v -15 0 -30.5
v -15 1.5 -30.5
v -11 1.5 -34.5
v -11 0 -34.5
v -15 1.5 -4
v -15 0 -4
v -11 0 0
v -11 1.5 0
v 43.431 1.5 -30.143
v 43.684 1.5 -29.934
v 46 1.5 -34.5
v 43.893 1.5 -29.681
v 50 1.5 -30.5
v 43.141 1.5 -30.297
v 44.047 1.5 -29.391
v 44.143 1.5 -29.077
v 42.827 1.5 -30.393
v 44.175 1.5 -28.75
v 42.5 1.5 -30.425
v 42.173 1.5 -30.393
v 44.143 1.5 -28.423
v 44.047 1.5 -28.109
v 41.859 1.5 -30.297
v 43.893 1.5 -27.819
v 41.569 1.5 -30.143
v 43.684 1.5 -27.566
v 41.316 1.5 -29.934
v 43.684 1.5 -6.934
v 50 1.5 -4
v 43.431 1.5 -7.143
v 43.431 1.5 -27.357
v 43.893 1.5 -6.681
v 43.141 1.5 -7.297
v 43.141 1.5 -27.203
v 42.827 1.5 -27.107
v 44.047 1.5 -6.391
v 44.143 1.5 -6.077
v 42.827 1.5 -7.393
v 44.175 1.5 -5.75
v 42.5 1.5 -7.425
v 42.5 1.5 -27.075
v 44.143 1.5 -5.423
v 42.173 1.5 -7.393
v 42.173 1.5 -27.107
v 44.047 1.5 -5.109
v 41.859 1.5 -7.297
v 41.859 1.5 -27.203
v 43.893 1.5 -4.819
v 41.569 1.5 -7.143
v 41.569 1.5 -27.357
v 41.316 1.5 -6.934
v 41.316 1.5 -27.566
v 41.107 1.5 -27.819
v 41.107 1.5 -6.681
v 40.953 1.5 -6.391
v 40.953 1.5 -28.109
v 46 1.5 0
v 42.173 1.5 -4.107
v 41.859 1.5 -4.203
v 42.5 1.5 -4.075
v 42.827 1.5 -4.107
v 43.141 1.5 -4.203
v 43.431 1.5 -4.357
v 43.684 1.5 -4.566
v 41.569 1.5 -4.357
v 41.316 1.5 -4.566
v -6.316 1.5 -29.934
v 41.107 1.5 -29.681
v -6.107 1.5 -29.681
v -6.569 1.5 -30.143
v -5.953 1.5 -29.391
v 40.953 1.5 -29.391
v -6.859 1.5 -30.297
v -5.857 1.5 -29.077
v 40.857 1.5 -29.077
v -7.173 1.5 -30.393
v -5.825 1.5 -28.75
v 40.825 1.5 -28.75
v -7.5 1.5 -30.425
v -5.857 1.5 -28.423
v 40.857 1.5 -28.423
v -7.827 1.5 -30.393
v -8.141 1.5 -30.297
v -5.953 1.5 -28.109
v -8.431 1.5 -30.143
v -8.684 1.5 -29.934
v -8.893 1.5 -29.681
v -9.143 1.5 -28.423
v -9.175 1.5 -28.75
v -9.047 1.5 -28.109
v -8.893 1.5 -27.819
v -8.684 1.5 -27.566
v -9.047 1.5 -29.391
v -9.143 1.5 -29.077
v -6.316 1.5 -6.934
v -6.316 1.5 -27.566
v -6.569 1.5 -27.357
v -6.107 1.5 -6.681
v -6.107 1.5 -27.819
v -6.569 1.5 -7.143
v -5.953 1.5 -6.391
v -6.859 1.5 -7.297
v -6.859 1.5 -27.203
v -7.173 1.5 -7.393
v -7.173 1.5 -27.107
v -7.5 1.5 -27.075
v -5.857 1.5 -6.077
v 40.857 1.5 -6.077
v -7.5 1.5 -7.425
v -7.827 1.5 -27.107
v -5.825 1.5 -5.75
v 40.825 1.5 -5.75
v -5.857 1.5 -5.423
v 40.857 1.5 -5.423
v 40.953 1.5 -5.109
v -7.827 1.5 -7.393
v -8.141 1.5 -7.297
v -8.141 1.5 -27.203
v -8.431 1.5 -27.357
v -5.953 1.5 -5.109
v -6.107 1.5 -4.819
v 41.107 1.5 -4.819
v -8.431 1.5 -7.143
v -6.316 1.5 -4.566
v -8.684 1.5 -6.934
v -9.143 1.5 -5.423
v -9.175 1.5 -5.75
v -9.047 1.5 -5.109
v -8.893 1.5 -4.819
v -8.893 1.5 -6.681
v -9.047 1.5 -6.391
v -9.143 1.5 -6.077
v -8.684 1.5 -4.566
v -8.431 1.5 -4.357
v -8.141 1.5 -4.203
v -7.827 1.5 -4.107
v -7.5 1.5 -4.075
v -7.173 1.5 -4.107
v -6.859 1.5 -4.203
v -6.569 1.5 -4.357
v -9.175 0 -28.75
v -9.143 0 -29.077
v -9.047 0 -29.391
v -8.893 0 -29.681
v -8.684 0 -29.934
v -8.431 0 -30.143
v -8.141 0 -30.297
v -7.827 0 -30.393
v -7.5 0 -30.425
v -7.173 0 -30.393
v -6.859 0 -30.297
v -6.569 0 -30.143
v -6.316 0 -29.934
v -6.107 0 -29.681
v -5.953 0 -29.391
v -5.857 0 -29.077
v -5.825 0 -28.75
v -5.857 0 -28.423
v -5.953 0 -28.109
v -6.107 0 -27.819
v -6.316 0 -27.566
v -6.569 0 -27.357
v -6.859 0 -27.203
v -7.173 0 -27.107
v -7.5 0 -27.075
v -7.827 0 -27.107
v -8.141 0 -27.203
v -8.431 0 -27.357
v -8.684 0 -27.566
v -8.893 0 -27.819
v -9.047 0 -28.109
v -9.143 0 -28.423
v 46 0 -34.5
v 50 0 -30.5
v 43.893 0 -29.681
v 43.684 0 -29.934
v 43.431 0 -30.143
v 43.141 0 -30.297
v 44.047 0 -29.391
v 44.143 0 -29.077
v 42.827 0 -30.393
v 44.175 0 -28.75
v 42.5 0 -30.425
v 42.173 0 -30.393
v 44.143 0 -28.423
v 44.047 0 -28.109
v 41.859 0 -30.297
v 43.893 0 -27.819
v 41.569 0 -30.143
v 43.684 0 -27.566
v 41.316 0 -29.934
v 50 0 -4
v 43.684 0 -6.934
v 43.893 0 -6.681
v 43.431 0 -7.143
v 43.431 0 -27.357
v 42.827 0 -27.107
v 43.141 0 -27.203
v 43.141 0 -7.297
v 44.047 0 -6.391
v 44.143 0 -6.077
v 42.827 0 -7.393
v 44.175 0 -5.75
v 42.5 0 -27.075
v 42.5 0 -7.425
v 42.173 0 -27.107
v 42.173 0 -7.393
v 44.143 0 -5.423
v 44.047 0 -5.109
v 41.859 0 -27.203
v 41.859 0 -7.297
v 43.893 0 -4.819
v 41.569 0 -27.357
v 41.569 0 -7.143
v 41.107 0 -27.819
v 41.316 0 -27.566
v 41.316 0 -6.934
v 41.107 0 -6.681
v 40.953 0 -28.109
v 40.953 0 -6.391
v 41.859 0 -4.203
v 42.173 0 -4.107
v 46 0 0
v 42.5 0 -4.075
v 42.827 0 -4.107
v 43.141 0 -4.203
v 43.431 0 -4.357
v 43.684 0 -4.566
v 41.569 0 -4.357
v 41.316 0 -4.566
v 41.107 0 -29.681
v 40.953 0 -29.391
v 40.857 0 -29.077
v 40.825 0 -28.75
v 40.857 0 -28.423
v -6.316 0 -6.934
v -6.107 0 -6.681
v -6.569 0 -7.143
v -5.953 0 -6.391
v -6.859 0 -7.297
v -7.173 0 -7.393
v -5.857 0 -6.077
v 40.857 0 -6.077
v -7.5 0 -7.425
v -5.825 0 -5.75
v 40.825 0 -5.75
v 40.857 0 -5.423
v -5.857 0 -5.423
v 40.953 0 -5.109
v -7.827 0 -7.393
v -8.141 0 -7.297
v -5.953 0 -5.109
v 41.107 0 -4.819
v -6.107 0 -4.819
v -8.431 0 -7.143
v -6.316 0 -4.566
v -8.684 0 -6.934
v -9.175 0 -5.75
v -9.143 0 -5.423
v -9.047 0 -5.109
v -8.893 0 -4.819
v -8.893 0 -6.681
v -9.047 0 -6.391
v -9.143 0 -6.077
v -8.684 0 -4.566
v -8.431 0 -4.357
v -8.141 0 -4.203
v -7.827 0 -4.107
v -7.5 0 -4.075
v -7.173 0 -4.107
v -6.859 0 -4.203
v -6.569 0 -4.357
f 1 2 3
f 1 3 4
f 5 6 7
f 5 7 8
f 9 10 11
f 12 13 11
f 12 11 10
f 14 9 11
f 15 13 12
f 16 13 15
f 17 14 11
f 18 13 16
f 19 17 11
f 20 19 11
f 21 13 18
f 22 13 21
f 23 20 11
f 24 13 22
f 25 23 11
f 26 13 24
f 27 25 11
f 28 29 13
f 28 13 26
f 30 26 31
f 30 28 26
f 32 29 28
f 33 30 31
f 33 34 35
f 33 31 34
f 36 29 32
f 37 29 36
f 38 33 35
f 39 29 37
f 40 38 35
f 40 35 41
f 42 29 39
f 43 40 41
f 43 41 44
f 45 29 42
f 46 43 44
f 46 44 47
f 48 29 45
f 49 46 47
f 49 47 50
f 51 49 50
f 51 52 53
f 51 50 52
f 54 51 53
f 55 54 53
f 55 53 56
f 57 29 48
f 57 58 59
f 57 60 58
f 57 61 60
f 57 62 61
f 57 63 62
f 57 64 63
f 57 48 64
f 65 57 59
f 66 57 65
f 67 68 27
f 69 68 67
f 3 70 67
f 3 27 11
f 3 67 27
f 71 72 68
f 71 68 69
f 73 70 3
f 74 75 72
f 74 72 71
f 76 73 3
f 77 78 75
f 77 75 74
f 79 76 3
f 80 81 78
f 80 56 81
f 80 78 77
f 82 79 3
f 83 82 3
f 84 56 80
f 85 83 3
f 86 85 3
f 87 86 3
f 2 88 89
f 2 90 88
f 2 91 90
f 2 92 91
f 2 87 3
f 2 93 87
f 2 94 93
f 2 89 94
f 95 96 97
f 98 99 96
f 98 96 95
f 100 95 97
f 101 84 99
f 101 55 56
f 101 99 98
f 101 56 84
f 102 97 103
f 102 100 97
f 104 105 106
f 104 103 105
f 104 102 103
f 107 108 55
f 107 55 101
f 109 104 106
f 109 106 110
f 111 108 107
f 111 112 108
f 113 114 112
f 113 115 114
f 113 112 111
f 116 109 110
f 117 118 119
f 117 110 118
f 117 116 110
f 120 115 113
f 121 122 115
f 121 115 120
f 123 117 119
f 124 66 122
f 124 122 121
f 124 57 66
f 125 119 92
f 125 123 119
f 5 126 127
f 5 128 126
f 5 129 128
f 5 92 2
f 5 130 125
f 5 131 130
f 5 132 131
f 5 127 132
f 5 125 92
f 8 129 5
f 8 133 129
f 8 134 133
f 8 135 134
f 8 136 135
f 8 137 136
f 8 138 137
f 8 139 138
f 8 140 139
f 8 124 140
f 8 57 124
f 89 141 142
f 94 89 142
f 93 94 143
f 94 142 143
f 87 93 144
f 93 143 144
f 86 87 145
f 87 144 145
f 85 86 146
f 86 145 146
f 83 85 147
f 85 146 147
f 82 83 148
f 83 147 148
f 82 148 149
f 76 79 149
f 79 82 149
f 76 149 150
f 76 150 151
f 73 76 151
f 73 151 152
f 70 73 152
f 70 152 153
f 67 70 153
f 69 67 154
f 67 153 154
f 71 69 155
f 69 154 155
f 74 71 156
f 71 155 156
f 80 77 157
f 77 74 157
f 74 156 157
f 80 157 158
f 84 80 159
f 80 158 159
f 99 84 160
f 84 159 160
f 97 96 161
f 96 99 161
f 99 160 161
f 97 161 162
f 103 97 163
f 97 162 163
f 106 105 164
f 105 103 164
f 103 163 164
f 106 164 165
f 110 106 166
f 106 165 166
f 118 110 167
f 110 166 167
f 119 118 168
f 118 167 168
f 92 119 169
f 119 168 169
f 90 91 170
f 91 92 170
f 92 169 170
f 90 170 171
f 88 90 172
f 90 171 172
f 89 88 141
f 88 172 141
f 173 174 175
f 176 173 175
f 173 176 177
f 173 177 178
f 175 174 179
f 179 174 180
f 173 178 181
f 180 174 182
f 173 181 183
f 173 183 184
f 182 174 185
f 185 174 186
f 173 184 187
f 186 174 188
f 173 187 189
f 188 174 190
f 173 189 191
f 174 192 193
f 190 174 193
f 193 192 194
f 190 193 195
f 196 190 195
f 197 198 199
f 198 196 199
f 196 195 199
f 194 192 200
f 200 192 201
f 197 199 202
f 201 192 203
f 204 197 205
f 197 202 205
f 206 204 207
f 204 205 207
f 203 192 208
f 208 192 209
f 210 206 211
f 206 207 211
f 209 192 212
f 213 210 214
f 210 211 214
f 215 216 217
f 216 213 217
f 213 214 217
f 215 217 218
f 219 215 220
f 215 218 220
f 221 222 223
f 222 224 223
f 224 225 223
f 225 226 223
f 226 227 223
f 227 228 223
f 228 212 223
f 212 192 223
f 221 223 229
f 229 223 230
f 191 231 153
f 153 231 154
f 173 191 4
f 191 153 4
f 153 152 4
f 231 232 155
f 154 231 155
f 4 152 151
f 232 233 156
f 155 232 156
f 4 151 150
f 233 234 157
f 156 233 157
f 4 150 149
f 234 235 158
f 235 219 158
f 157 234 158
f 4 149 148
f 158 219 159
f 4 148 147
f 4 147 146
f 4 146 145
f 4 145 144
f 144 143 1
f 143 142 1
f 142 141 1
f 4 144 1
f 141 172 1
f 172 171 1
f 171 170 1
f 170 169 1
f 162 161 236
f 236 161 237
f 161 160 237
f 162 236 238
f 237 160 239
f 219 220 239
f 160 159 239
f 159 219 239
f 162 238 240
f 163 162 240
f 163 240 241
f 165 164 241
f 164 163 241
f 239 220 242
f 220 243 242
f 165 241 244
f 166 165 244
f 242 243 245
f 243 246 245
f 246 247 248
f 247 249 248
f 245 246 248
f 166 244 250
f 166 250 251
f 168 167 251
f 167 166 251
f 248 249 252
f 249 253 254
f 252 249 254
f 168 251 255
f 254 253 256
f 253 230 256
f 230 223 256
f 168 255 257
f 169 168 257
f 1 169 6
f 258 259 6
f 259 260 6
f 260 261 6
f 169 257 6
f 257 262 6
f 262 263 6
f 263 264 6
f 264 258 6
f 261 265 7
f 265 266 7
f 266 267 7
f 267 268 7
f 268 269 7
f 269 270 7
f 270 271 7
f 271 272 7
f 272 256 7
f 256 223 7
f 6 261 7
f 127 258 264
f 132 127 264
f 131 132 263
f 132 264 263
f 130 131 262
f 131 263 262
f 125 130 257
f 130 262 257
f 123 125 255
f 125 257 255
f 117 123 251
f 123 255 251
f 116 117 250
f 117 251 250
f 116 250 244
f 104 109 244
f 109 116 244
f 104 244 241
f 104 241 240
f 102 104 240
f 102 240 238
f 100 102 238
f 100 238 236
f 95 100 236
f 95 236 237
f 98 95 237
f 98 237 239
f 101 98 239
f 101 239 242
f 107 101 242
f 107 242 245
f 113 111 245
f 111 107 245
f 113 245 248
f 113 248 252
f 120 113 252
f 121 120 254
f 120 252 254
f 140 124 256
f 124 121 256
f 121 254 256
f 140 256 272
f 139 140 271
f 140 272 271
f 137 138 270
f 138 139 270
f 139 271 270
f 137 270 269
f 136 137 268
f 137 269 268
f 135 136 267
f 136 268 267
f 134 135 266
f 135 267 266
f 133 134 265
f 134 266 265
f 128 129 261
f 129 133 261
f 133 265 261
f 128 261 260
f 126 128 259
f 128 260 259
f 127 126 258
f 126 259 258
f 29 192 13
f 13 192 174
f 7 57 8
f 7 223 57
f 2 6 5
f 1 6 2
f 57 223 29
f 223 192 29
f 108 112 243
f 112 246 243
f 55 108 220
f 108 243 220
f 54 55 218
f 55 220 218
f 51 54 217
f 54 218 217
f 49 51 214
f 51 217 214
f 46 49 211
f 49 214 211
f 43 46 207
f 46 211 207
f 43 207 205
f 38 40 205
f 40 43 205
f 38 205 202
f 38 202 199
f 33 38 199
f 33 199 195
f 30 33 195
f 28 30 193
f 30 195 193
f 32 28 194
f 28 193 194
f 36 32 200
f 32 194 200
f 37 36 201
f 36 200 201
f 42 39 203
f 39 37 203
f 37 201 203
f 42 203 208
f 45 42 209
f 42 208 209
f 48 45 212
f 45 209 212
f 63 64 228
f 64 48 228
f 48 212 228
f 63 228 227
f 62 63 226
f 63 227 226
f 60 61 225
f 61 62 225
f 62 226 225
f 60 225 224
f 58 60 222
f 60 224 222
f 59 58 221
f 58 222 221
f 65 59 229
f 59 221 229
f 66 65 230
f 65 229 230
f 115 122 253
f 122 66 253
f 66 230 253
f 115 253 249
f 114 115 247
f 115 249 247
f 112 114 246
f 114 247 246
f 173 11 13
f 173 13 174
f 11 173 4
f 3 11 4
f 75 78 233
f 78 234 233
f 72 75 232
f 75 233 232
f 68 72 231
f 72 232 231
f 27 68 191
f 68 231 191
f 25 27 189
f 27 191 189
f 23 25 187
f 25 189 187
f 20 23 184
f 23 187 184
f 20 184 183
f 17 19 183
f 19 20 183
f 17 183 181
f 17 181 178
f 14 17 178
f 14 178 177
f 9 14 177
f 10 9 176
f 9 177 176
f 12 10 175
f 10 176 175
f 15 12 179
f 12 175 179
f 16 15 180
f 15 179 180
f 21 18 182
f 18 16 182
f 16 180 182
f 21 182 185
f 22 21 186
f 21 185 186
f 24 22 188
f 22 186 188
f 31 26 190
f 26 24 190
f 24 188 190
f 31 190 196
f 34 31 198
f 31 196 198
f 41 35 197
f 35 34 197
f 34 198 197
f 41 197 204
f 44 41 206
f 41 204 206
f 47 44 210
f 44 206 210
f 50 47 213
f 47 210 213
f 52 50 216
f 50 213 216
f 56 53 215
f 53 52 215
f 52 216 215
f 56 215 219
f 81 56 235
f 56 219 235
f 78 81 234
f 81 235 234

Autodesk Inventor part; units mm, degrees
ref_plane "YZ Plane" through (0, 0, 0) normal (1, 0, 0) x (0, 1, 0)
ref_plane "XZ Plane" through (0, 0, 0) normal (0, 1, 0) x (-1, 0, 0)
ref_plane "XY Plane" through (0, 0, 0) normal (0, 0, 1) x (1, 0, 0)
sketch "Sketch1" plane through (0, 0, 0) normal (0, 1, 0) x (-1, 0, 0)
  line L0 (0, 0) -> (15, 0)
  line L1 (15, 0) -> (15, -34.5)
  line L2 (15, -34.5) -> (0, -34.5)
  line L3 (0, -34.5) -> (0, 0)
  line L4 (0, -17.25) -> (15, -17.25)
  circle A0 centre (7.5, -5.75) radius 1.675
  circle A1 centre (7.5, -28.75) radius 1.675
  circle A2 centre (-42.5, -5.75) radius 1.675
  line L5 (15, 0) -> (-50, 0)
  line L6 (-50, 0) -> (-50, -34.5)
  line L7 (-50, -34.5) -> (15, -34.5)
  line L8 (15, -34.5) -> (15, 0)
  circle A3 centre (-42.5, -28.75) radius 1.675
  point P0 (0, -34.5)
  dimension "d0" = 34.5
  dimension "d1" = 15
  dimension "d2" = 3.35
  dimension "d3" = 7.5
  dimension "d4" = 11.5
  dimension "d9" = 3.35
  dimension "d10" = 50
  dimension "d11" = 7.5
  dimension "d12" = 5.75
extrude "Plate1" add sketch "Sketch1" along normal blind 1.5
chamfer "Corner Chamfer1" distance 4 angle 45 4 edges at (-15, 0.75, 0) (-15, 0.75, -34.5) (50, 0.75, 0) (50, 0.75, -34.5)
equation "\"d0\" = 0.75 * A_width"
equation "\"d2\" = rivet_diameter"
equation "\"d3\" = 0.5 * d1"
equation "\"d4\" = 0.25 * A_width"
equation "\"d9\" = rivet_diameter"
equation "\"d5\" = Thickness"
equation "\"Thickness\" = thin_plate"
equation "\"BendRadius\" = Thickness"
equation "\"BendReliefWidth\" = Thickness"
equation "\"BendReliefDepth\" = 0.5 * Thickness"
equation "\"CornerReliefSize\" = 4 * Thickness"
equation "\"MinimumRemnant\" = 2 * Thickness"
equation "\"TransitionRadius\" = BendRadius"
equation "\"JacobiRadiusSize\" = BendRadius"
equation "\"GapSize\" = Thickness"
equation "\"A_width\" = 46"
equation "\"A_joint_diameter\" = 16"
equation "\"A_joint_tolerance\" = 3"
equation "\"l___________\" = 0"
equation "\"l__________\" = 0"
equation "\"l_________\" = 0"
equation "\"rivet_diameter\" = 3.35"
equation "\"plate_thickness\" = 3"
equation "\"l________\" = 0"
equation "\"A_B_spacing\" = 2"
equation "\"L_Piston_Bottom\" = 21"
equation "\"L_Piston_Top\" = 25"
equation "\"thin_plate\" = 1.5"
properties part number "A1_joiners" material "Stainless Steel"
